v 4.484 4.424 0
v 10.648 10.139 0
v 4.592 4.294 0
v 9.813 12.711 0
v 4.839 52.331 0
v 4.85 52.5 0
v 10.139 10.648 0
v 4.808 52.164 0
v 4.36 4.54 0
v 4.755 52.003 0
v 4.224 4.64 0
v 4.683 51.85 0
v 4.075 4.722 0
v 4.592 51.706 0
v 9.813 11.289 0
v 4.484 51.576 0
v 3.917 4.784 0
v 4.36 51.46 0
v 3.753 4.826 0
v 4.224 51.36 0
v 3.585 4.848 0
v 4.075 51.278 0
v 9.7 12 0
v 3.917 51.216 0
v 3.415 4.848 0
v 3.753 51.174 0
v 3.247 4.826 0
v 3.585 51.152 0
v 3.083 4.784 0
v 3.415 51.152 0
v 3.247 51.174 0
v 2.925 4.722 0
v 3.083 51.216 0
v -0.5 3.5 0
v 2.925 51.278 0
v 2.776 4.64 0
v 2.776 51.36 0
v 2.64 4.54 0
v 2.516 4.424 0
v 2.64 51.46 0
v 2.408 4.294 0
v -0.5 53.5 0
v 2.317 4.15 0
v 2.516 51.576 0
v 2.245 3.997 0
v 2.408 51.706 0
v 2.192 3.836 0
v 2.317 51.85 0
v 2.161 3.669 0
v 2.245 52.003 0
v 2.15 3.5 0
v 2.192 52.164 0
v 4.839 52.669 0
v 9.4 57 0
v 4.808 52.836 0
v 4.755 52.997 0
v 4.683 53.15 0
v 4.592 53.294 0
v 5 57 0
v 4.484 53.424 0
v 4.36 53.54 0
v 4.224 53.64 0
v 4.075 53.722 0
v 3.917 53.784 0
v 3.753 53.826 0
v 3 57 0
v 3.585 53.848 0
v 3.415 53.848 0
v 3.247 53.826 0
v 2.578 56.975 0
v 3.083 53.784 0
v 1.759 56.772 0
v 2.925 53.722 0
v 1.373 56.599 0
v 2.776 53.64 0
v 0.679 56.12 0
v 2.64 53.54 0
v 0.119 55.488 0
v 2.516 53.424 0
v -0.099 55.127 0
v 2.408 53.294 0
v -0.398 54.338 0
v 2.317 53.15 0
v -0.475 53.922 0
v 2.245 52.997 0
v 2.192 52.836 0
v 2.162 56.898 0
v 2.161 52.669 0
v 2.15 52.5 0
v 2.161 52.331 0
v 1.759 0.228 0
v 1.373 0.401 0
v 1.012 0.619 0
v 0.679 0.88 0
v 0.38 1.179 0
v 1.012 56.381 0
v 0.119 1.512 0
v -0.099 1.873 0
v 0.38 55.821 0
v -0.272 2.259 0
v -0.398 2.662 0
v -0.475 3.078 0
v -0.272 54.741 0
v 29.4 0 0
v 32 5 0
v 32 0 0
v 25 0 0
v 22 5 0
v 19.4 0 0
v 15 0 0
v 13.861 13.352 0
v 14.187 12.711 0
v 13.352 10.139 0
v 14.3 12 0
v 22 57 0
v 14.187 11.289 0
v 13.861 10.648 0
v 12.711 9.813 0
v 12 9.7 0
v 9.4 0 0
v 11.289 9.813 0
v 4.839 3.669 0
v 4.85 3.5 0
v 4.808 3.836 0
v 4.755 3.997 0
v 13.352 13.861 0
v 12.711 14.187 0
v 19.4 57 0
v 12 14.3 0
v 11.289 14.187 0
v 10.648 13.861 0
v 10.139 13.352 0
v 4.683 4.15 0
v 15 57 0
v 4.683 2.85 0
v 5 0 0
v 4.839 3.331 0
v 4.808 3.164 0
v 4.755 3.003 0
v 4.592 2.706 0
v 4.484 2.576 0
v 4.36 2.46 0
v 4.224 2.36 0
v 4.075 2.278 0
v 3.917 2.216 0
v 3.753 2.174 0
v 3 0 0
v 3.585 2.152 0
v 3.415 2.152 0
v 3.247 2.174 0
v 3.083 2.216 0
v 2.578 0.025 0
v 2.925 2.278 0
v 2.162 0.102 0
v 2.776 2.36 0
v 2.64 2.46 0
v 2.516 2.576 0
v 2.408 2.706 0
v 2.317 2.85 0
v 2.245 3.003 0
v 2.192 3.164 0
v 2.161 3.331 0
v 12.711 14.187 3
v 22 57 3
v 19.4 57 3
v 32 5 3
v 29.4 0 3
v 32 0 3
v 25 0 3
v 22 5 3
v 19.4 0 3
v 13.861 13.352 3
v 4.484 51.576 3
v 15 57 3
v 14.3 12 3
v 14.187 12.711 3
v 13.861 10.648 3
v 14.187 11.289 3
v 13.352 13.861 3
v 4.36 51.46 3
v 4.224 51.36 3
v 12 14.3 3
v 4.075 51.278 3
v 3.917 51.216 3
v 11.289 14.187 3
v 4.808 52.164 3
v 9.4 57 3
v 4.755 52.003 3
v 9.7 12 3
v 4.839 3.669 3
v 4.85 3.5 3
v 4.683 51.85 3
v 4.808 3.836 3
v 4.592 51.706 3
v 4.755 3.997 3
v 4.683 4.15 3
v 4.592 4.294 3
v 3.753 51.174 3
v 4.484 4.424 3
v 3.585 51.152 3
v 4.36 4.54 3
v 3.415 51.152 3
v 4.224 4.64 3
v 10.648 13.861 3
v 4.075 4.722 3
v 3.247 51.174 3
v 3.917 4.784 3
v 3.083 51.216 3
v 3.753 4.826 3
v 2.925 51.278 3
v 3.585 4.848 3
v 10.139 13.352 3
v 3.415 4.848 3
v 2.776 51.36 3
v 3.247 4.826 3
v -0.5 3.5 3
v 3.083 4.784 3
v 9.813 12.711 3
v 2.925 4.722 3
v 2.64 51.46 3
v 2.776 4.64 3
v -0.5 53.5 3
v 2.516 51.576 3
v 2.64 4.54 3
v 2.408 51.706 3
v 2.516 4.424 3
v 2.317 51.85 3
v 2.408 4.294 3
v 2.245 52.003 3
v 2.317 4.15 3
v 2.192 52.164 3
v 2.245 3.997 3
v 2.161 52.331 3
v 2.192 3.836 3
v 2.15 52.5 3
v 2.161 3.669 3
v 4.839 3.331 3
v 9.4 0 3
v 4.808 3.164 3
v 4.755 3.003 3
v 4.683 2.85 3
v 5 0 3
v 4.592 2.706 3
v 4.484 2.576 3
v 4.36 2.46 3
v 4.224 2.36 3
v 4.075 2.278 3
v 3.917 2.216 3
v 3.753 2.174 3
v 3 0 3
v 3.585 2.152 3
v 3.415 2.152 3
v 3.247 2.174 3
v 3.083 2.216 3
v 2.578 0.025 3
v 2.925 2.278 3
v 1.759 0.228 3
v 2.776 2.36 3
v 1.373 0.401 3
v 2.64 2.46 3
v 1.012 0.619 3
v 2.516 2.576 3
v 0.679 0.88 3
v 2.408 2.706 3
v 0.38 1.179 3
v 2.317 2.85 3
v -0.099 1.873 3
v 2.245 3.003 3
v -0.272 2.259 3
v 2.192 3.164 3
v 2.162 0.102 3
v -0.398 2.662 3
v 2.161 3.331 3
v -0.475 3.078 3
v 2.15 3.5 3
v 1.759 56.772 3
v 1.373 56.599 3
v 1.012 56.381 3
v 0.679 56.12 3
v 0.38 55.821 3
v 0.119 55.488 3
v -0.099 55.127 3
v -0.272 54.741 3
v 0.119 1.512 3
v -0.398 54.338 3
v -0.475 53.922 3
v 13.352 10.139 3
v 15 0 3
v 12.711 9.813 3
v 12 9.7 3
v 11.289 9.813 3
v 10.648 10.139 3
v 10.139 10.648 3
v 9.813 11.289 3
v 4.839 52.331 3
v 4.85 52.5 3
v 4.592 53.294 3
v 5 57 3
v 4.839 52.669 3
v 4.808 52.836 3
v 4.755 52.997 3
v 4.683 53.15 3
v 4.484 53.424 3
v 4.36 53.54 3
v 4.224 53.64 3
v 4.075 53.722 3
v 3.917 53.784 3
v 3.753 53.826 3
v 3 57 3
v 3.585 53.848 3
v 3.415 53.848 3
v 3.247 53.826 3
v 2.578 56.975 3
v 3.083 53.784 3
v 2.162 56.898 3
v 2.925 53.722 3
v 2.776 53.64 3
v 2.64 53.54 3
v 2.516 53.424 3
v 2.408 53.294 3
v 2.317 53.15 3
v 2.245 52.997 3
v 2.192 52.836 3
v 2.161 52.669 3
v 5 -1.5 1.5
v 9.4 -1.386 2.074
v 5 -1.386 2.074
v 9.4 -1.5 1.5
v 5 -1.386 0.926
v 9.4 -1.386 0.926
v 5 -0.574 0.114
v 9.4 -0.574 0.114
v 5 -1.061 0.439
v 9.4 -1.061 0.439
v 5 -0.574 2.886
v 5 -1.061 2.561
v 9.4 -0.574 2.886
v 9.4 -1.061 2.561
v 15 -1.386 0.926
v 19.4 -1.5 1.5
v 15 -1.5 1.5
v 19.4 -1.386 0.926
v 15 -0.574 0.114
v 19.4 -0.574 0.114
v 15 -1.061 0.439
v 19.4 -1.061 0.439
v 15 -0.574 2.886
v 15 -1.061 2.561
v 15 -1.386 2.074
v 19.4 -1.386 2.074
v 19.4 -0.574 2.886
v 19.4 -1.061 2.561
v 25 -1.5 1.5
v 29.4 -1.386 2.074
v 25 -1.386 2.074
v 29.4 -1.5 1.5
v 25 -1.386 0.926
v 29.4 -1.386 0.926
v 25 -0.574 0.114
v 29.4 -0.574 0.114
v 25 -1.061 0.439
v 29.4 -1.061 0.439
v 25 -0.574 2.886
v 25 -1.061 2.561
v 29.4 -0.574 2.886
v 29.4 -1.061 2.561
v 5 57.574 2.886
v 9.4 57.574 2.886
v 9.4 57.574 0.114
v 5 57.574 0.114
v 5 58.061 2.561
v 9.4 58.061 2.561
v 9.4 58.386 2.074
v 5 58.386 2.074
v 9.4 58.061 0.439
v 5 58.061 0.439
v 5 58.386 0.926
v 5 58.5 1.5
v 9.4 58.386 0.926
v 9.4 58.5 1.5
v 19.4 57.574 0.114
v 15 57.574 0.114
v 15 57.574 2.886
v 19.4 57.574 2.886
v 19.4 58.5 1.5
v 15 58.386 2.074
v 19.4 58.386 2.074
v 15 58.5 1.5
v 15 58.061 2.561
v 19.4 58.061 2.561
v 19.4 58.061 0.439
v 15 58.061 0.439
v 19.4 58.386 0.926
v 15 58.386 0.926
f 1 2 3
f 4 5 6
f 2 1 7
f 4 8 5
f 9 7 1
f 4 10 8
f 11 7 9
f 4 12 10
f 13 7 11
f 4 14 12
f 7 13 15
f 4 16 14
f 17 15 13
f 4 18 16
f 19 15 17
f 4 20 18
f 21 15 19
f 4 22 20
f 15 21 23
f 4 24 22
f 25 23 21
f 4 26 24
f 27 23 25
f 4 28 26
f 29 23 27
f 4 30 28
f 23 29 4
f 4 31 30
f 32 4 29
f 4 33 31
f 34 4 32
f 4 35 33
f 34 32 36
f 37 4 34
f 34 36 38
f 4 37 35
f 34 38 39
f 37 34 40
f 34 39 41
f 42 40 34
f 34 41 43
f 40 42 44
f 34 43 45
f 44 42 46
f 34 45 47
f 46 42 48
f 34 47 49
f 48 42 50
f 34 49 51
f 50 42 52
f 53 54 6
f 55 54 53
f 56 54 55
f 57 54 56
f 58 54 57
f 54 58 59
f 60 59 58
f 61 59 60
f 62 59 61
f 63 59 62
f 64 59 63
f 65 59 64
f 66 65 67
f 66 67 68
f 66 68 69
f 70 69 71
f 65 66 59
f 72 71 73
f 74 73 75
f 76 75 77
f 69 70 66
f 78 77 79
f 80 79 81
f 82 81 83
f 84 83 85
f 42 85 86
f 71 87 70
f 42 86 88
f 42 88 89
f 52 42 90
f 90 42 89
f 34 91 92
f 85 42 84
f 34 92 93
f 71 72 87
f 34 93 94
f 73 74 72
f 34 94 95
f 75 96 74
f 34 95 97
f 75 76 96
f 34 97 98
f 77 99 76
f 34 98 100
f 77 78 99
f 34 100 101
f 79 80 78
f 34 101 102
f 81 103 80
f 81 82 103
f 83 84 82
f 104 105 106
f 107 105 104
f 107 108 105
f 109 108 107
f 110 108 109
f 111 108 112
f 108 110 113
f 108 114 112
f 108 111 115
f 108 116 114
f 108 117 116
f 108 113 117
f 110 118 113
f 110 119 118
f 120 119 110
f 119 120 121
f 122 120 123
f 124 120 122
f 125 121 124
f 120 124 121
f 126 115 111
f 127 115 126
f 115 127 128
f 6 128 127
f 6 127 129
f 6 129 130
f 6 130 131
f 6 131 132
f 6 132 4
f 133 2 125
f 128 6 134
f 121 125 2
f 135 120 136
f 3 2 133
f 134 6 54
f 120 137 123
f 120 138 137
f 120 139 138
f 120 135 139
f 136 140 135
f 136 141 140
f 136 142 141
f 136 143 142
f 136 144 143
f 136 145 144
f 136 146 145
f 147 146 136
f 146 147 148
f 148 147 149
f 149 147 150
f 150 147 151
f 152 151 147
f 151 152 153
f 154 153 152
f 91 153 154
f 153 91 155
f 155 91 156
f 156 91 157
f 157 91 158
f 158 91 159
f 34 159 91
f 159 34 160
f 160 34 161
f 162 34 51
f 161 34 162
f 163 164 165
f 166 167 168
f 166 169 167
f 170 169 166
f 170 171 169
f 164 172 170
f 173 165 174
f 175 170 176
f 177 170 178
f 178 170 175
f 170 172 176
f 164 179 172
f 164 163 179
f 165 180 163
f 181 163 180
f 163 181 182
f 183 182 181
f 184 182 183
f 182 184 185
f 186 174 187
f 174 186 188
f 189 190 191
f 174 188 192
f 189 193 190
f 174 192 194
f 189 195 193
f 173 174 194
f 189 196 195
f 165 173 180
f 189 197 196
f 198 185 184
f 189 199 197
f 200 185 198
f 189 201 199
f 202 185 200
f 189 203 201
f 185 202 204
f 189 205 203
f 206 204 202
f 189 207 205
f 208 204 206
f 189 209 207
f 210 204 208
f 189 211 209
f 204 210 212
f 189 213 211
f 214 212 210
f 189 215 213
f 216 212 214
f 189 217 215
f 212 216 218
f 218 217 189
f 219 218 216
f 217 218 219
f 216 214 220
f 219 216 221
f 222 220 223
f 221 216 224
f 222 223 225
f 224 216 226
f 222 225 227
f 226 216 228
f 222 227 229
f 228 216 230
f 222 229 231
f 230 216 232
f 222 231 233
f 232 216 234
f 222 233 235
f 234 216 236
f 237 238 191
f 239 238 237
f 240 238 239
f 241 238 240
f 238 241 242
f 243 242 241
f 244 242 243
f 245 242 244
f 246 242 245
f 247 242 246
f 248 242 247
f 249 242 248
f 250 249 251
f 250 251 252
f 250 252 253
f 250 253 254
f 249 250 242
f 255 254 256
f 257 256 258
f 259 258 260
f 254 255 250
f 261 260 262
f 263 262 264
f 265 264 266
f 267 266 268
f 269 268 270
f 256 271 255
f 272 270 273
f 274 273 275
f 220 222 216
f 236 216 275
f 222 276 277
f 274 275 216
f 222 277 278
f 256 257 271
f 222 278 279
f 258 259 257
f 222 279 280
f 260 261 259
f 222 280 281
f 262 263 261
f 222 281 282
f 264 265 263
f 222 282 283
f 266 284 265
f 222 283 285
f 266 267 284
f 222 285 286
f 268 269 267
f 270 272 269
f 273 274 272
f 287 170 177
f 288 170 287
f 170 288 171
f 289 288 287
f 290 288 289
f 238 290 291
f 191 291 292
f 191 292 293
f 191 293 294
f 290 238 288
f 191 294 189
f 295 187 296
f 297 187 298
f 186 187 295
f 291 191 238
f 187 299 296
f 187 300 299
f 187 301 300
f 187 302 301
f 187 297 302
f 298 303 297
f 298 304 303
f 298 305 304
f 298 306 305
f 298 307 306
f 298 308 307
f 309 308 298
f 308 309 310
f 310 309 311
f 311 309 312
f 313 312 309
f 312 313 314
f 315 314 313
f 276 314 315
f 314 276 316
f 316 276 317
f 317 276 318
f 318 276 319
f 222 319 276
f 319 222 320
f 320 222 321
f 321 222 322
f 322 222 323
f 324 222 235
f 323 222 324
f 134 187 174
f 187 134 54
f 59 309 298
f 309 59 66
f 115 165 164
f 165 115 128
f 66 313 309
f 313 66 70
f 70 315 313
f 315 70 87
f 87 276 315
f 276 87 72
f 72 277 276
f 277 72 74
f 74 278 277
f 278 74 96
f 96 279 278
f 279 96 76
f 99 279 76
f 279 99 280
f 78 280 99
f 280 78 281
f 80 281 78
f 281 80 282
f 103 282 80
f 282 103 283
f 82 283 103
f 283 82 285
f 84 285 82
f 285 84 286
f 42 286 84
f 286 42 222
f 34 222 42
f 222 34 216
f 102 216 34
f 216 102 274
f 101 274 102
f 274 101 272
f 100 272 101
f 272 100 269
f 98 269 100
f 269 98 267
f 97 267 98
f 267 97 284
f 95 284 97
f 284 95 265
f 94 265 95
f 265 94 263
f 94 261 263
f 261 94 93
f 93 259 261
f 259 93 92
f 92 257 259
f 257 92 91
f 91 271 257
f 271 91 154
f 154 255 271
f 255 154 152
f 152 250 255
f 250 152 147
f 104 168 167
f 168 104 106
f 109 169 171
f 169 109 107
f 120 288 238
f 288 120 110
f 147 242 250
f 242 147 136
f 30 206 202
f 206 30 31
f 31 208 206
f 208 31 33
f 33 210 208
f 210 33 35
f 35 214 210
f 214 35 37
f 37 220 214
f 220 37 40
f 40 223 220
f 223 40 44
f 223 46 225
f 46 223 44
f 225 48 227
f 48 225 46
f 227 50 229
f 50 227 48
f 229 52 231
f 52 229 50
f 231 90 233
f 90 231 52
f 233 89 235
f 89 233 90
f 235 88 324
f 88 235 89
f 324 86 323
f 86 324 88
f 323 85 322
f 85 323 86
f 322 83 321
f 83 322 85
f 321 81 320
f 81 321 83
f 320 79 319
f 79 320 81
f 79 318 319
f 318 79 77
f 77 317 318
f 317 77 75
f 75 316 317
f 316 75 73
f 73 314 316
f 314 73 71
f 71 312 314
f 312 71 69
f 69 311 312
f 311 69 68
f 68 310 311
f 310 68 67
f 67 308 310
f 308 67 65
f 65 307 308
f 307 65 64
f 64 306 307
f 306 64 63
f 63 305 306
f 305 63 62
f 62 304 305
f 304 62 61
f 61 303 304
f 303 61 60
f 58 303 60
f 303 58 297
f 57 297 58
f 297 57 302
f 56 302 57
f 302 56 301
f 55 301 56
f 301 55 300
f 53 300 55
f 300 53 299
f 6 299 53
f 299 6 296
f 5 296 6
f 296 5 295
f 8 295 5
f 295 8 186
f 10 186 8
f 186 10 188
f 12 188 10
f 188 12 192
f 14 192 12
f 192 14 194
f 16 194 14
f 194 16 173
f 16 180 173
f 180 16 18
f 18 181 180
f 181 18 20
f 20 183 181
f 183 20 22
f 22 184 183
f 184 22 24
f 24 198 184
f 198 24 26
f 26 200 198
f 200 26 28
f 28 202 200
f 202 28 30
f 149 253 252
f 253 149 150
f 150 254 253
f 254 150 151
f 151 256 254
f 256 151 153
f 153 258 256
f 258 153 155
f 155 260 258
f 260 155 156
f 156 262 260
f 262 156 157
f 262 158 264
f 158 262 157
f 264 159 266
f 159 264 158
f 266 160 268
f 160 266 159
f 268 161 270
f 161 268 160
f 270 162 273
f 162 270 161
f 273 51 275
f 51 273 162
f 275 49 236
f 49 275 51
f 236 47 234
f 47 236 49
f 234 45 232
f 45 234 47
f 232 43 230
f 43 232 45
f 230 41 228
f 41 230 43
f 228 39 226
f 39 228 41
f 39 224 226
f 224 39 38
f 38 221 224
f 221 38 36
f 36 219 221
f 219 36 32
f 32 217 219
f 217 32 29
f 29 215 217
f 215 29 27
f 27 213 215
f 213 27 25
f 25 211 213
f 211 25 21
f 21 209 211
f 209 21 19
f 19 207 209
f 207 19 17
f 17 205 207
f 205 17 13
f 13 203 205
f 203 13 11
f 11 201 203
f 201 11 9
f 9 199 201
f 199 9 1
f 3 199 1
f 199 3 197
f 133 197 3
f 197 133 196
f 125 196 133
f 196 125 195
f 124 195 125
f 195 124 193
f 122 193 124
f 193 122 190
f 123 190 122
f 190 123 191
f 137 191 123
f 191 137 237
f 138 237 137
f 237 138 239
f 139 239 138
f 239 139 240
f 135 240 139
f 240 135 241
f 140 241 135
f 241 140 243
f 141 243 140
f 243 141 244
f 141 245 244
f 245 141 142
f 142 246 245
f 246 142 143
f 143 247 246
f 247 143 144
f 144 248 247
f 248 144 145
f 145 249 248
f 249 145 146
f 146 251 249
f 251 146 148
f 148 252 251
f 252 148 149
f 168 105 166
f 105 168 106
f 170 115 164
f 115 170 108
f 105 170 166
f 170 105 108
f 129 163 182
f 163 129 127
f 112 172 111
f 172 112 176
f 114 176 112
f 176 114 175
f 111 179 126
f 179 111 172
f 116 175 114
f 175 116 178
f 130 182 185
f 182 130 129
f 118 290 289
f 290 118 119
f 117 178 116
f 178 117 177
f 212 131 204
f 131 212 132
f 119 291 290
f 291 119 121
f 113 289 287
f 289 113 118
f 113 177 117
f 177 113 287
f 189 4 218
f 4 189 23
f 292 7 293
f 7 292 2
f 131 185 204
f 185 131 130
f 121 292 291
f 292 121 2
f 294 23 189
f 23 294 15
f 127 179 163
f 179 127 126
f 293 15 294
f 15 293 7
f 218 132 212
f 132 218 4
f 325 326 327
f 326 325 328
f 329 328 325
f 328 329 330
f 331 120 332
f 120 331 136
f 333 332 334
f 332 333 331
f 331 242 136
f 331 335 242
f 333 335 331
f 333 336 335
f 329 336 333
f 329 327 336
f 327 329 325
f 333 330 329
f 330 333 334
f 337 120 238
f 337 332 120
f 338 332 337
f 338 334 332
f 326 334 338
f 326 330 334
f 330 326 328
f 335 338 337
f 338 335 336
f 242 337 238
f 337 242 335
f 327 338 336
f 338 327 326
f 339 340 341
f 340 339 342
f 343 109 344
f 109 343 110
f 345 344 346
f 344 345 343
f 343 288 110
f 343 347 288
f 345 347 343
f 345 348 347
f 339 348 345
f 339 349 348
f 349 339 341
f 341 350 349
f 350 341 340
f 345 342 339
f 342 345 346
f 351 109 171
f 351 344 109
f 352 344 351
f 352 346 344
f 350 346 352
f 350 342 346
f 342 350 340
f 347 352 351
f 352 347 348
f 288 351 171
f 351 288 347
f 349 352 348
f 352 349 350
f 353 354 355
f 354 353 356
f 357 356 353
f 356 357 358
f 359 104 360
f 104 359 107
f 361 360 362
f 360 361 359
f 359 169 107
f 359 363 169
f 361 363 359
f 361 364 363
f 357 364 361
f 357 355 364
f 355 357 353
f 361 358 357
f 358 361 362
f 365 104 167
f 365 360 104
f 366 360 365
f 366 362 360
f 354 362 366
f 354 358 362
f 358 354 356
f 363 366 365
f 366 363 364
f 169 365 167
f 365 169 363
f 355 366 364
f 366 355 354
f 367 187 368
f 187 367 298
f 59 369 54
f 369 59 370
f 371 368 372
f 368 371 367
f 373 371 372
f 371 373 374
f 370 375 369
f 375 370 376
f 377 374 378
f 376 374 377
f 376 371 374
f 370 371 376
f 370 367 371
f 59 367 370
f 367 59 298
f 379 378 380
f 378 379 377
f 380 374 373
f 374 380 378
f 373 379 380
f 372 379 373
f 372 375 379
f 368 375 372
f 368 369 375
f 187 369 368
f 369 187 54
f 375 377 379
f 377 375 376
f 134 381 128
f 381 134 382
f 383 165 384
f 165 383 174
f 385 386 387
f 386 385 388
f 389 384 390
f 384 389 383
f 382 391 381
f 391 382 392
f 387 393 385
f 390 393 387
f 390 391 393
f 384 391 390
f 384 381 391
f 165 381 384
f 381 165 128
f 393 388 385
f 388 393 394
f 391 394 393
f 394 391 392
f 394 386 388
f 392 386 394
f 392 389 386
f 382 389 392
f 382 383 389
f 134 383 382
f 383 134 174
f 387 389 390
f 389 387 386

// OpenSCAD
difference(){
linear_extrude(3)
	import("../dxf/RPi_3B.dxf", $fn=50);
translate([32,-1,-1])
	cube([55,70,5]);
translate([22,5,-1])
	cube([55,60,5]);

translate([12,12,-1])
	cylinder(5,2.3,2.3, $fn=20);
}

//connectors
for (i =[5:10:30]){
	translate([(i),0,1.5])
		rotate([0,90,0])
			cylinder(4.4,1.5,1.5, $fn=16);
}
for (i =[5:10:20]){
	translate([(i),57,1.5])
		rotate([0,90,0])
			cylinder(4.4,1.5,1.5, $fn=16);
}
